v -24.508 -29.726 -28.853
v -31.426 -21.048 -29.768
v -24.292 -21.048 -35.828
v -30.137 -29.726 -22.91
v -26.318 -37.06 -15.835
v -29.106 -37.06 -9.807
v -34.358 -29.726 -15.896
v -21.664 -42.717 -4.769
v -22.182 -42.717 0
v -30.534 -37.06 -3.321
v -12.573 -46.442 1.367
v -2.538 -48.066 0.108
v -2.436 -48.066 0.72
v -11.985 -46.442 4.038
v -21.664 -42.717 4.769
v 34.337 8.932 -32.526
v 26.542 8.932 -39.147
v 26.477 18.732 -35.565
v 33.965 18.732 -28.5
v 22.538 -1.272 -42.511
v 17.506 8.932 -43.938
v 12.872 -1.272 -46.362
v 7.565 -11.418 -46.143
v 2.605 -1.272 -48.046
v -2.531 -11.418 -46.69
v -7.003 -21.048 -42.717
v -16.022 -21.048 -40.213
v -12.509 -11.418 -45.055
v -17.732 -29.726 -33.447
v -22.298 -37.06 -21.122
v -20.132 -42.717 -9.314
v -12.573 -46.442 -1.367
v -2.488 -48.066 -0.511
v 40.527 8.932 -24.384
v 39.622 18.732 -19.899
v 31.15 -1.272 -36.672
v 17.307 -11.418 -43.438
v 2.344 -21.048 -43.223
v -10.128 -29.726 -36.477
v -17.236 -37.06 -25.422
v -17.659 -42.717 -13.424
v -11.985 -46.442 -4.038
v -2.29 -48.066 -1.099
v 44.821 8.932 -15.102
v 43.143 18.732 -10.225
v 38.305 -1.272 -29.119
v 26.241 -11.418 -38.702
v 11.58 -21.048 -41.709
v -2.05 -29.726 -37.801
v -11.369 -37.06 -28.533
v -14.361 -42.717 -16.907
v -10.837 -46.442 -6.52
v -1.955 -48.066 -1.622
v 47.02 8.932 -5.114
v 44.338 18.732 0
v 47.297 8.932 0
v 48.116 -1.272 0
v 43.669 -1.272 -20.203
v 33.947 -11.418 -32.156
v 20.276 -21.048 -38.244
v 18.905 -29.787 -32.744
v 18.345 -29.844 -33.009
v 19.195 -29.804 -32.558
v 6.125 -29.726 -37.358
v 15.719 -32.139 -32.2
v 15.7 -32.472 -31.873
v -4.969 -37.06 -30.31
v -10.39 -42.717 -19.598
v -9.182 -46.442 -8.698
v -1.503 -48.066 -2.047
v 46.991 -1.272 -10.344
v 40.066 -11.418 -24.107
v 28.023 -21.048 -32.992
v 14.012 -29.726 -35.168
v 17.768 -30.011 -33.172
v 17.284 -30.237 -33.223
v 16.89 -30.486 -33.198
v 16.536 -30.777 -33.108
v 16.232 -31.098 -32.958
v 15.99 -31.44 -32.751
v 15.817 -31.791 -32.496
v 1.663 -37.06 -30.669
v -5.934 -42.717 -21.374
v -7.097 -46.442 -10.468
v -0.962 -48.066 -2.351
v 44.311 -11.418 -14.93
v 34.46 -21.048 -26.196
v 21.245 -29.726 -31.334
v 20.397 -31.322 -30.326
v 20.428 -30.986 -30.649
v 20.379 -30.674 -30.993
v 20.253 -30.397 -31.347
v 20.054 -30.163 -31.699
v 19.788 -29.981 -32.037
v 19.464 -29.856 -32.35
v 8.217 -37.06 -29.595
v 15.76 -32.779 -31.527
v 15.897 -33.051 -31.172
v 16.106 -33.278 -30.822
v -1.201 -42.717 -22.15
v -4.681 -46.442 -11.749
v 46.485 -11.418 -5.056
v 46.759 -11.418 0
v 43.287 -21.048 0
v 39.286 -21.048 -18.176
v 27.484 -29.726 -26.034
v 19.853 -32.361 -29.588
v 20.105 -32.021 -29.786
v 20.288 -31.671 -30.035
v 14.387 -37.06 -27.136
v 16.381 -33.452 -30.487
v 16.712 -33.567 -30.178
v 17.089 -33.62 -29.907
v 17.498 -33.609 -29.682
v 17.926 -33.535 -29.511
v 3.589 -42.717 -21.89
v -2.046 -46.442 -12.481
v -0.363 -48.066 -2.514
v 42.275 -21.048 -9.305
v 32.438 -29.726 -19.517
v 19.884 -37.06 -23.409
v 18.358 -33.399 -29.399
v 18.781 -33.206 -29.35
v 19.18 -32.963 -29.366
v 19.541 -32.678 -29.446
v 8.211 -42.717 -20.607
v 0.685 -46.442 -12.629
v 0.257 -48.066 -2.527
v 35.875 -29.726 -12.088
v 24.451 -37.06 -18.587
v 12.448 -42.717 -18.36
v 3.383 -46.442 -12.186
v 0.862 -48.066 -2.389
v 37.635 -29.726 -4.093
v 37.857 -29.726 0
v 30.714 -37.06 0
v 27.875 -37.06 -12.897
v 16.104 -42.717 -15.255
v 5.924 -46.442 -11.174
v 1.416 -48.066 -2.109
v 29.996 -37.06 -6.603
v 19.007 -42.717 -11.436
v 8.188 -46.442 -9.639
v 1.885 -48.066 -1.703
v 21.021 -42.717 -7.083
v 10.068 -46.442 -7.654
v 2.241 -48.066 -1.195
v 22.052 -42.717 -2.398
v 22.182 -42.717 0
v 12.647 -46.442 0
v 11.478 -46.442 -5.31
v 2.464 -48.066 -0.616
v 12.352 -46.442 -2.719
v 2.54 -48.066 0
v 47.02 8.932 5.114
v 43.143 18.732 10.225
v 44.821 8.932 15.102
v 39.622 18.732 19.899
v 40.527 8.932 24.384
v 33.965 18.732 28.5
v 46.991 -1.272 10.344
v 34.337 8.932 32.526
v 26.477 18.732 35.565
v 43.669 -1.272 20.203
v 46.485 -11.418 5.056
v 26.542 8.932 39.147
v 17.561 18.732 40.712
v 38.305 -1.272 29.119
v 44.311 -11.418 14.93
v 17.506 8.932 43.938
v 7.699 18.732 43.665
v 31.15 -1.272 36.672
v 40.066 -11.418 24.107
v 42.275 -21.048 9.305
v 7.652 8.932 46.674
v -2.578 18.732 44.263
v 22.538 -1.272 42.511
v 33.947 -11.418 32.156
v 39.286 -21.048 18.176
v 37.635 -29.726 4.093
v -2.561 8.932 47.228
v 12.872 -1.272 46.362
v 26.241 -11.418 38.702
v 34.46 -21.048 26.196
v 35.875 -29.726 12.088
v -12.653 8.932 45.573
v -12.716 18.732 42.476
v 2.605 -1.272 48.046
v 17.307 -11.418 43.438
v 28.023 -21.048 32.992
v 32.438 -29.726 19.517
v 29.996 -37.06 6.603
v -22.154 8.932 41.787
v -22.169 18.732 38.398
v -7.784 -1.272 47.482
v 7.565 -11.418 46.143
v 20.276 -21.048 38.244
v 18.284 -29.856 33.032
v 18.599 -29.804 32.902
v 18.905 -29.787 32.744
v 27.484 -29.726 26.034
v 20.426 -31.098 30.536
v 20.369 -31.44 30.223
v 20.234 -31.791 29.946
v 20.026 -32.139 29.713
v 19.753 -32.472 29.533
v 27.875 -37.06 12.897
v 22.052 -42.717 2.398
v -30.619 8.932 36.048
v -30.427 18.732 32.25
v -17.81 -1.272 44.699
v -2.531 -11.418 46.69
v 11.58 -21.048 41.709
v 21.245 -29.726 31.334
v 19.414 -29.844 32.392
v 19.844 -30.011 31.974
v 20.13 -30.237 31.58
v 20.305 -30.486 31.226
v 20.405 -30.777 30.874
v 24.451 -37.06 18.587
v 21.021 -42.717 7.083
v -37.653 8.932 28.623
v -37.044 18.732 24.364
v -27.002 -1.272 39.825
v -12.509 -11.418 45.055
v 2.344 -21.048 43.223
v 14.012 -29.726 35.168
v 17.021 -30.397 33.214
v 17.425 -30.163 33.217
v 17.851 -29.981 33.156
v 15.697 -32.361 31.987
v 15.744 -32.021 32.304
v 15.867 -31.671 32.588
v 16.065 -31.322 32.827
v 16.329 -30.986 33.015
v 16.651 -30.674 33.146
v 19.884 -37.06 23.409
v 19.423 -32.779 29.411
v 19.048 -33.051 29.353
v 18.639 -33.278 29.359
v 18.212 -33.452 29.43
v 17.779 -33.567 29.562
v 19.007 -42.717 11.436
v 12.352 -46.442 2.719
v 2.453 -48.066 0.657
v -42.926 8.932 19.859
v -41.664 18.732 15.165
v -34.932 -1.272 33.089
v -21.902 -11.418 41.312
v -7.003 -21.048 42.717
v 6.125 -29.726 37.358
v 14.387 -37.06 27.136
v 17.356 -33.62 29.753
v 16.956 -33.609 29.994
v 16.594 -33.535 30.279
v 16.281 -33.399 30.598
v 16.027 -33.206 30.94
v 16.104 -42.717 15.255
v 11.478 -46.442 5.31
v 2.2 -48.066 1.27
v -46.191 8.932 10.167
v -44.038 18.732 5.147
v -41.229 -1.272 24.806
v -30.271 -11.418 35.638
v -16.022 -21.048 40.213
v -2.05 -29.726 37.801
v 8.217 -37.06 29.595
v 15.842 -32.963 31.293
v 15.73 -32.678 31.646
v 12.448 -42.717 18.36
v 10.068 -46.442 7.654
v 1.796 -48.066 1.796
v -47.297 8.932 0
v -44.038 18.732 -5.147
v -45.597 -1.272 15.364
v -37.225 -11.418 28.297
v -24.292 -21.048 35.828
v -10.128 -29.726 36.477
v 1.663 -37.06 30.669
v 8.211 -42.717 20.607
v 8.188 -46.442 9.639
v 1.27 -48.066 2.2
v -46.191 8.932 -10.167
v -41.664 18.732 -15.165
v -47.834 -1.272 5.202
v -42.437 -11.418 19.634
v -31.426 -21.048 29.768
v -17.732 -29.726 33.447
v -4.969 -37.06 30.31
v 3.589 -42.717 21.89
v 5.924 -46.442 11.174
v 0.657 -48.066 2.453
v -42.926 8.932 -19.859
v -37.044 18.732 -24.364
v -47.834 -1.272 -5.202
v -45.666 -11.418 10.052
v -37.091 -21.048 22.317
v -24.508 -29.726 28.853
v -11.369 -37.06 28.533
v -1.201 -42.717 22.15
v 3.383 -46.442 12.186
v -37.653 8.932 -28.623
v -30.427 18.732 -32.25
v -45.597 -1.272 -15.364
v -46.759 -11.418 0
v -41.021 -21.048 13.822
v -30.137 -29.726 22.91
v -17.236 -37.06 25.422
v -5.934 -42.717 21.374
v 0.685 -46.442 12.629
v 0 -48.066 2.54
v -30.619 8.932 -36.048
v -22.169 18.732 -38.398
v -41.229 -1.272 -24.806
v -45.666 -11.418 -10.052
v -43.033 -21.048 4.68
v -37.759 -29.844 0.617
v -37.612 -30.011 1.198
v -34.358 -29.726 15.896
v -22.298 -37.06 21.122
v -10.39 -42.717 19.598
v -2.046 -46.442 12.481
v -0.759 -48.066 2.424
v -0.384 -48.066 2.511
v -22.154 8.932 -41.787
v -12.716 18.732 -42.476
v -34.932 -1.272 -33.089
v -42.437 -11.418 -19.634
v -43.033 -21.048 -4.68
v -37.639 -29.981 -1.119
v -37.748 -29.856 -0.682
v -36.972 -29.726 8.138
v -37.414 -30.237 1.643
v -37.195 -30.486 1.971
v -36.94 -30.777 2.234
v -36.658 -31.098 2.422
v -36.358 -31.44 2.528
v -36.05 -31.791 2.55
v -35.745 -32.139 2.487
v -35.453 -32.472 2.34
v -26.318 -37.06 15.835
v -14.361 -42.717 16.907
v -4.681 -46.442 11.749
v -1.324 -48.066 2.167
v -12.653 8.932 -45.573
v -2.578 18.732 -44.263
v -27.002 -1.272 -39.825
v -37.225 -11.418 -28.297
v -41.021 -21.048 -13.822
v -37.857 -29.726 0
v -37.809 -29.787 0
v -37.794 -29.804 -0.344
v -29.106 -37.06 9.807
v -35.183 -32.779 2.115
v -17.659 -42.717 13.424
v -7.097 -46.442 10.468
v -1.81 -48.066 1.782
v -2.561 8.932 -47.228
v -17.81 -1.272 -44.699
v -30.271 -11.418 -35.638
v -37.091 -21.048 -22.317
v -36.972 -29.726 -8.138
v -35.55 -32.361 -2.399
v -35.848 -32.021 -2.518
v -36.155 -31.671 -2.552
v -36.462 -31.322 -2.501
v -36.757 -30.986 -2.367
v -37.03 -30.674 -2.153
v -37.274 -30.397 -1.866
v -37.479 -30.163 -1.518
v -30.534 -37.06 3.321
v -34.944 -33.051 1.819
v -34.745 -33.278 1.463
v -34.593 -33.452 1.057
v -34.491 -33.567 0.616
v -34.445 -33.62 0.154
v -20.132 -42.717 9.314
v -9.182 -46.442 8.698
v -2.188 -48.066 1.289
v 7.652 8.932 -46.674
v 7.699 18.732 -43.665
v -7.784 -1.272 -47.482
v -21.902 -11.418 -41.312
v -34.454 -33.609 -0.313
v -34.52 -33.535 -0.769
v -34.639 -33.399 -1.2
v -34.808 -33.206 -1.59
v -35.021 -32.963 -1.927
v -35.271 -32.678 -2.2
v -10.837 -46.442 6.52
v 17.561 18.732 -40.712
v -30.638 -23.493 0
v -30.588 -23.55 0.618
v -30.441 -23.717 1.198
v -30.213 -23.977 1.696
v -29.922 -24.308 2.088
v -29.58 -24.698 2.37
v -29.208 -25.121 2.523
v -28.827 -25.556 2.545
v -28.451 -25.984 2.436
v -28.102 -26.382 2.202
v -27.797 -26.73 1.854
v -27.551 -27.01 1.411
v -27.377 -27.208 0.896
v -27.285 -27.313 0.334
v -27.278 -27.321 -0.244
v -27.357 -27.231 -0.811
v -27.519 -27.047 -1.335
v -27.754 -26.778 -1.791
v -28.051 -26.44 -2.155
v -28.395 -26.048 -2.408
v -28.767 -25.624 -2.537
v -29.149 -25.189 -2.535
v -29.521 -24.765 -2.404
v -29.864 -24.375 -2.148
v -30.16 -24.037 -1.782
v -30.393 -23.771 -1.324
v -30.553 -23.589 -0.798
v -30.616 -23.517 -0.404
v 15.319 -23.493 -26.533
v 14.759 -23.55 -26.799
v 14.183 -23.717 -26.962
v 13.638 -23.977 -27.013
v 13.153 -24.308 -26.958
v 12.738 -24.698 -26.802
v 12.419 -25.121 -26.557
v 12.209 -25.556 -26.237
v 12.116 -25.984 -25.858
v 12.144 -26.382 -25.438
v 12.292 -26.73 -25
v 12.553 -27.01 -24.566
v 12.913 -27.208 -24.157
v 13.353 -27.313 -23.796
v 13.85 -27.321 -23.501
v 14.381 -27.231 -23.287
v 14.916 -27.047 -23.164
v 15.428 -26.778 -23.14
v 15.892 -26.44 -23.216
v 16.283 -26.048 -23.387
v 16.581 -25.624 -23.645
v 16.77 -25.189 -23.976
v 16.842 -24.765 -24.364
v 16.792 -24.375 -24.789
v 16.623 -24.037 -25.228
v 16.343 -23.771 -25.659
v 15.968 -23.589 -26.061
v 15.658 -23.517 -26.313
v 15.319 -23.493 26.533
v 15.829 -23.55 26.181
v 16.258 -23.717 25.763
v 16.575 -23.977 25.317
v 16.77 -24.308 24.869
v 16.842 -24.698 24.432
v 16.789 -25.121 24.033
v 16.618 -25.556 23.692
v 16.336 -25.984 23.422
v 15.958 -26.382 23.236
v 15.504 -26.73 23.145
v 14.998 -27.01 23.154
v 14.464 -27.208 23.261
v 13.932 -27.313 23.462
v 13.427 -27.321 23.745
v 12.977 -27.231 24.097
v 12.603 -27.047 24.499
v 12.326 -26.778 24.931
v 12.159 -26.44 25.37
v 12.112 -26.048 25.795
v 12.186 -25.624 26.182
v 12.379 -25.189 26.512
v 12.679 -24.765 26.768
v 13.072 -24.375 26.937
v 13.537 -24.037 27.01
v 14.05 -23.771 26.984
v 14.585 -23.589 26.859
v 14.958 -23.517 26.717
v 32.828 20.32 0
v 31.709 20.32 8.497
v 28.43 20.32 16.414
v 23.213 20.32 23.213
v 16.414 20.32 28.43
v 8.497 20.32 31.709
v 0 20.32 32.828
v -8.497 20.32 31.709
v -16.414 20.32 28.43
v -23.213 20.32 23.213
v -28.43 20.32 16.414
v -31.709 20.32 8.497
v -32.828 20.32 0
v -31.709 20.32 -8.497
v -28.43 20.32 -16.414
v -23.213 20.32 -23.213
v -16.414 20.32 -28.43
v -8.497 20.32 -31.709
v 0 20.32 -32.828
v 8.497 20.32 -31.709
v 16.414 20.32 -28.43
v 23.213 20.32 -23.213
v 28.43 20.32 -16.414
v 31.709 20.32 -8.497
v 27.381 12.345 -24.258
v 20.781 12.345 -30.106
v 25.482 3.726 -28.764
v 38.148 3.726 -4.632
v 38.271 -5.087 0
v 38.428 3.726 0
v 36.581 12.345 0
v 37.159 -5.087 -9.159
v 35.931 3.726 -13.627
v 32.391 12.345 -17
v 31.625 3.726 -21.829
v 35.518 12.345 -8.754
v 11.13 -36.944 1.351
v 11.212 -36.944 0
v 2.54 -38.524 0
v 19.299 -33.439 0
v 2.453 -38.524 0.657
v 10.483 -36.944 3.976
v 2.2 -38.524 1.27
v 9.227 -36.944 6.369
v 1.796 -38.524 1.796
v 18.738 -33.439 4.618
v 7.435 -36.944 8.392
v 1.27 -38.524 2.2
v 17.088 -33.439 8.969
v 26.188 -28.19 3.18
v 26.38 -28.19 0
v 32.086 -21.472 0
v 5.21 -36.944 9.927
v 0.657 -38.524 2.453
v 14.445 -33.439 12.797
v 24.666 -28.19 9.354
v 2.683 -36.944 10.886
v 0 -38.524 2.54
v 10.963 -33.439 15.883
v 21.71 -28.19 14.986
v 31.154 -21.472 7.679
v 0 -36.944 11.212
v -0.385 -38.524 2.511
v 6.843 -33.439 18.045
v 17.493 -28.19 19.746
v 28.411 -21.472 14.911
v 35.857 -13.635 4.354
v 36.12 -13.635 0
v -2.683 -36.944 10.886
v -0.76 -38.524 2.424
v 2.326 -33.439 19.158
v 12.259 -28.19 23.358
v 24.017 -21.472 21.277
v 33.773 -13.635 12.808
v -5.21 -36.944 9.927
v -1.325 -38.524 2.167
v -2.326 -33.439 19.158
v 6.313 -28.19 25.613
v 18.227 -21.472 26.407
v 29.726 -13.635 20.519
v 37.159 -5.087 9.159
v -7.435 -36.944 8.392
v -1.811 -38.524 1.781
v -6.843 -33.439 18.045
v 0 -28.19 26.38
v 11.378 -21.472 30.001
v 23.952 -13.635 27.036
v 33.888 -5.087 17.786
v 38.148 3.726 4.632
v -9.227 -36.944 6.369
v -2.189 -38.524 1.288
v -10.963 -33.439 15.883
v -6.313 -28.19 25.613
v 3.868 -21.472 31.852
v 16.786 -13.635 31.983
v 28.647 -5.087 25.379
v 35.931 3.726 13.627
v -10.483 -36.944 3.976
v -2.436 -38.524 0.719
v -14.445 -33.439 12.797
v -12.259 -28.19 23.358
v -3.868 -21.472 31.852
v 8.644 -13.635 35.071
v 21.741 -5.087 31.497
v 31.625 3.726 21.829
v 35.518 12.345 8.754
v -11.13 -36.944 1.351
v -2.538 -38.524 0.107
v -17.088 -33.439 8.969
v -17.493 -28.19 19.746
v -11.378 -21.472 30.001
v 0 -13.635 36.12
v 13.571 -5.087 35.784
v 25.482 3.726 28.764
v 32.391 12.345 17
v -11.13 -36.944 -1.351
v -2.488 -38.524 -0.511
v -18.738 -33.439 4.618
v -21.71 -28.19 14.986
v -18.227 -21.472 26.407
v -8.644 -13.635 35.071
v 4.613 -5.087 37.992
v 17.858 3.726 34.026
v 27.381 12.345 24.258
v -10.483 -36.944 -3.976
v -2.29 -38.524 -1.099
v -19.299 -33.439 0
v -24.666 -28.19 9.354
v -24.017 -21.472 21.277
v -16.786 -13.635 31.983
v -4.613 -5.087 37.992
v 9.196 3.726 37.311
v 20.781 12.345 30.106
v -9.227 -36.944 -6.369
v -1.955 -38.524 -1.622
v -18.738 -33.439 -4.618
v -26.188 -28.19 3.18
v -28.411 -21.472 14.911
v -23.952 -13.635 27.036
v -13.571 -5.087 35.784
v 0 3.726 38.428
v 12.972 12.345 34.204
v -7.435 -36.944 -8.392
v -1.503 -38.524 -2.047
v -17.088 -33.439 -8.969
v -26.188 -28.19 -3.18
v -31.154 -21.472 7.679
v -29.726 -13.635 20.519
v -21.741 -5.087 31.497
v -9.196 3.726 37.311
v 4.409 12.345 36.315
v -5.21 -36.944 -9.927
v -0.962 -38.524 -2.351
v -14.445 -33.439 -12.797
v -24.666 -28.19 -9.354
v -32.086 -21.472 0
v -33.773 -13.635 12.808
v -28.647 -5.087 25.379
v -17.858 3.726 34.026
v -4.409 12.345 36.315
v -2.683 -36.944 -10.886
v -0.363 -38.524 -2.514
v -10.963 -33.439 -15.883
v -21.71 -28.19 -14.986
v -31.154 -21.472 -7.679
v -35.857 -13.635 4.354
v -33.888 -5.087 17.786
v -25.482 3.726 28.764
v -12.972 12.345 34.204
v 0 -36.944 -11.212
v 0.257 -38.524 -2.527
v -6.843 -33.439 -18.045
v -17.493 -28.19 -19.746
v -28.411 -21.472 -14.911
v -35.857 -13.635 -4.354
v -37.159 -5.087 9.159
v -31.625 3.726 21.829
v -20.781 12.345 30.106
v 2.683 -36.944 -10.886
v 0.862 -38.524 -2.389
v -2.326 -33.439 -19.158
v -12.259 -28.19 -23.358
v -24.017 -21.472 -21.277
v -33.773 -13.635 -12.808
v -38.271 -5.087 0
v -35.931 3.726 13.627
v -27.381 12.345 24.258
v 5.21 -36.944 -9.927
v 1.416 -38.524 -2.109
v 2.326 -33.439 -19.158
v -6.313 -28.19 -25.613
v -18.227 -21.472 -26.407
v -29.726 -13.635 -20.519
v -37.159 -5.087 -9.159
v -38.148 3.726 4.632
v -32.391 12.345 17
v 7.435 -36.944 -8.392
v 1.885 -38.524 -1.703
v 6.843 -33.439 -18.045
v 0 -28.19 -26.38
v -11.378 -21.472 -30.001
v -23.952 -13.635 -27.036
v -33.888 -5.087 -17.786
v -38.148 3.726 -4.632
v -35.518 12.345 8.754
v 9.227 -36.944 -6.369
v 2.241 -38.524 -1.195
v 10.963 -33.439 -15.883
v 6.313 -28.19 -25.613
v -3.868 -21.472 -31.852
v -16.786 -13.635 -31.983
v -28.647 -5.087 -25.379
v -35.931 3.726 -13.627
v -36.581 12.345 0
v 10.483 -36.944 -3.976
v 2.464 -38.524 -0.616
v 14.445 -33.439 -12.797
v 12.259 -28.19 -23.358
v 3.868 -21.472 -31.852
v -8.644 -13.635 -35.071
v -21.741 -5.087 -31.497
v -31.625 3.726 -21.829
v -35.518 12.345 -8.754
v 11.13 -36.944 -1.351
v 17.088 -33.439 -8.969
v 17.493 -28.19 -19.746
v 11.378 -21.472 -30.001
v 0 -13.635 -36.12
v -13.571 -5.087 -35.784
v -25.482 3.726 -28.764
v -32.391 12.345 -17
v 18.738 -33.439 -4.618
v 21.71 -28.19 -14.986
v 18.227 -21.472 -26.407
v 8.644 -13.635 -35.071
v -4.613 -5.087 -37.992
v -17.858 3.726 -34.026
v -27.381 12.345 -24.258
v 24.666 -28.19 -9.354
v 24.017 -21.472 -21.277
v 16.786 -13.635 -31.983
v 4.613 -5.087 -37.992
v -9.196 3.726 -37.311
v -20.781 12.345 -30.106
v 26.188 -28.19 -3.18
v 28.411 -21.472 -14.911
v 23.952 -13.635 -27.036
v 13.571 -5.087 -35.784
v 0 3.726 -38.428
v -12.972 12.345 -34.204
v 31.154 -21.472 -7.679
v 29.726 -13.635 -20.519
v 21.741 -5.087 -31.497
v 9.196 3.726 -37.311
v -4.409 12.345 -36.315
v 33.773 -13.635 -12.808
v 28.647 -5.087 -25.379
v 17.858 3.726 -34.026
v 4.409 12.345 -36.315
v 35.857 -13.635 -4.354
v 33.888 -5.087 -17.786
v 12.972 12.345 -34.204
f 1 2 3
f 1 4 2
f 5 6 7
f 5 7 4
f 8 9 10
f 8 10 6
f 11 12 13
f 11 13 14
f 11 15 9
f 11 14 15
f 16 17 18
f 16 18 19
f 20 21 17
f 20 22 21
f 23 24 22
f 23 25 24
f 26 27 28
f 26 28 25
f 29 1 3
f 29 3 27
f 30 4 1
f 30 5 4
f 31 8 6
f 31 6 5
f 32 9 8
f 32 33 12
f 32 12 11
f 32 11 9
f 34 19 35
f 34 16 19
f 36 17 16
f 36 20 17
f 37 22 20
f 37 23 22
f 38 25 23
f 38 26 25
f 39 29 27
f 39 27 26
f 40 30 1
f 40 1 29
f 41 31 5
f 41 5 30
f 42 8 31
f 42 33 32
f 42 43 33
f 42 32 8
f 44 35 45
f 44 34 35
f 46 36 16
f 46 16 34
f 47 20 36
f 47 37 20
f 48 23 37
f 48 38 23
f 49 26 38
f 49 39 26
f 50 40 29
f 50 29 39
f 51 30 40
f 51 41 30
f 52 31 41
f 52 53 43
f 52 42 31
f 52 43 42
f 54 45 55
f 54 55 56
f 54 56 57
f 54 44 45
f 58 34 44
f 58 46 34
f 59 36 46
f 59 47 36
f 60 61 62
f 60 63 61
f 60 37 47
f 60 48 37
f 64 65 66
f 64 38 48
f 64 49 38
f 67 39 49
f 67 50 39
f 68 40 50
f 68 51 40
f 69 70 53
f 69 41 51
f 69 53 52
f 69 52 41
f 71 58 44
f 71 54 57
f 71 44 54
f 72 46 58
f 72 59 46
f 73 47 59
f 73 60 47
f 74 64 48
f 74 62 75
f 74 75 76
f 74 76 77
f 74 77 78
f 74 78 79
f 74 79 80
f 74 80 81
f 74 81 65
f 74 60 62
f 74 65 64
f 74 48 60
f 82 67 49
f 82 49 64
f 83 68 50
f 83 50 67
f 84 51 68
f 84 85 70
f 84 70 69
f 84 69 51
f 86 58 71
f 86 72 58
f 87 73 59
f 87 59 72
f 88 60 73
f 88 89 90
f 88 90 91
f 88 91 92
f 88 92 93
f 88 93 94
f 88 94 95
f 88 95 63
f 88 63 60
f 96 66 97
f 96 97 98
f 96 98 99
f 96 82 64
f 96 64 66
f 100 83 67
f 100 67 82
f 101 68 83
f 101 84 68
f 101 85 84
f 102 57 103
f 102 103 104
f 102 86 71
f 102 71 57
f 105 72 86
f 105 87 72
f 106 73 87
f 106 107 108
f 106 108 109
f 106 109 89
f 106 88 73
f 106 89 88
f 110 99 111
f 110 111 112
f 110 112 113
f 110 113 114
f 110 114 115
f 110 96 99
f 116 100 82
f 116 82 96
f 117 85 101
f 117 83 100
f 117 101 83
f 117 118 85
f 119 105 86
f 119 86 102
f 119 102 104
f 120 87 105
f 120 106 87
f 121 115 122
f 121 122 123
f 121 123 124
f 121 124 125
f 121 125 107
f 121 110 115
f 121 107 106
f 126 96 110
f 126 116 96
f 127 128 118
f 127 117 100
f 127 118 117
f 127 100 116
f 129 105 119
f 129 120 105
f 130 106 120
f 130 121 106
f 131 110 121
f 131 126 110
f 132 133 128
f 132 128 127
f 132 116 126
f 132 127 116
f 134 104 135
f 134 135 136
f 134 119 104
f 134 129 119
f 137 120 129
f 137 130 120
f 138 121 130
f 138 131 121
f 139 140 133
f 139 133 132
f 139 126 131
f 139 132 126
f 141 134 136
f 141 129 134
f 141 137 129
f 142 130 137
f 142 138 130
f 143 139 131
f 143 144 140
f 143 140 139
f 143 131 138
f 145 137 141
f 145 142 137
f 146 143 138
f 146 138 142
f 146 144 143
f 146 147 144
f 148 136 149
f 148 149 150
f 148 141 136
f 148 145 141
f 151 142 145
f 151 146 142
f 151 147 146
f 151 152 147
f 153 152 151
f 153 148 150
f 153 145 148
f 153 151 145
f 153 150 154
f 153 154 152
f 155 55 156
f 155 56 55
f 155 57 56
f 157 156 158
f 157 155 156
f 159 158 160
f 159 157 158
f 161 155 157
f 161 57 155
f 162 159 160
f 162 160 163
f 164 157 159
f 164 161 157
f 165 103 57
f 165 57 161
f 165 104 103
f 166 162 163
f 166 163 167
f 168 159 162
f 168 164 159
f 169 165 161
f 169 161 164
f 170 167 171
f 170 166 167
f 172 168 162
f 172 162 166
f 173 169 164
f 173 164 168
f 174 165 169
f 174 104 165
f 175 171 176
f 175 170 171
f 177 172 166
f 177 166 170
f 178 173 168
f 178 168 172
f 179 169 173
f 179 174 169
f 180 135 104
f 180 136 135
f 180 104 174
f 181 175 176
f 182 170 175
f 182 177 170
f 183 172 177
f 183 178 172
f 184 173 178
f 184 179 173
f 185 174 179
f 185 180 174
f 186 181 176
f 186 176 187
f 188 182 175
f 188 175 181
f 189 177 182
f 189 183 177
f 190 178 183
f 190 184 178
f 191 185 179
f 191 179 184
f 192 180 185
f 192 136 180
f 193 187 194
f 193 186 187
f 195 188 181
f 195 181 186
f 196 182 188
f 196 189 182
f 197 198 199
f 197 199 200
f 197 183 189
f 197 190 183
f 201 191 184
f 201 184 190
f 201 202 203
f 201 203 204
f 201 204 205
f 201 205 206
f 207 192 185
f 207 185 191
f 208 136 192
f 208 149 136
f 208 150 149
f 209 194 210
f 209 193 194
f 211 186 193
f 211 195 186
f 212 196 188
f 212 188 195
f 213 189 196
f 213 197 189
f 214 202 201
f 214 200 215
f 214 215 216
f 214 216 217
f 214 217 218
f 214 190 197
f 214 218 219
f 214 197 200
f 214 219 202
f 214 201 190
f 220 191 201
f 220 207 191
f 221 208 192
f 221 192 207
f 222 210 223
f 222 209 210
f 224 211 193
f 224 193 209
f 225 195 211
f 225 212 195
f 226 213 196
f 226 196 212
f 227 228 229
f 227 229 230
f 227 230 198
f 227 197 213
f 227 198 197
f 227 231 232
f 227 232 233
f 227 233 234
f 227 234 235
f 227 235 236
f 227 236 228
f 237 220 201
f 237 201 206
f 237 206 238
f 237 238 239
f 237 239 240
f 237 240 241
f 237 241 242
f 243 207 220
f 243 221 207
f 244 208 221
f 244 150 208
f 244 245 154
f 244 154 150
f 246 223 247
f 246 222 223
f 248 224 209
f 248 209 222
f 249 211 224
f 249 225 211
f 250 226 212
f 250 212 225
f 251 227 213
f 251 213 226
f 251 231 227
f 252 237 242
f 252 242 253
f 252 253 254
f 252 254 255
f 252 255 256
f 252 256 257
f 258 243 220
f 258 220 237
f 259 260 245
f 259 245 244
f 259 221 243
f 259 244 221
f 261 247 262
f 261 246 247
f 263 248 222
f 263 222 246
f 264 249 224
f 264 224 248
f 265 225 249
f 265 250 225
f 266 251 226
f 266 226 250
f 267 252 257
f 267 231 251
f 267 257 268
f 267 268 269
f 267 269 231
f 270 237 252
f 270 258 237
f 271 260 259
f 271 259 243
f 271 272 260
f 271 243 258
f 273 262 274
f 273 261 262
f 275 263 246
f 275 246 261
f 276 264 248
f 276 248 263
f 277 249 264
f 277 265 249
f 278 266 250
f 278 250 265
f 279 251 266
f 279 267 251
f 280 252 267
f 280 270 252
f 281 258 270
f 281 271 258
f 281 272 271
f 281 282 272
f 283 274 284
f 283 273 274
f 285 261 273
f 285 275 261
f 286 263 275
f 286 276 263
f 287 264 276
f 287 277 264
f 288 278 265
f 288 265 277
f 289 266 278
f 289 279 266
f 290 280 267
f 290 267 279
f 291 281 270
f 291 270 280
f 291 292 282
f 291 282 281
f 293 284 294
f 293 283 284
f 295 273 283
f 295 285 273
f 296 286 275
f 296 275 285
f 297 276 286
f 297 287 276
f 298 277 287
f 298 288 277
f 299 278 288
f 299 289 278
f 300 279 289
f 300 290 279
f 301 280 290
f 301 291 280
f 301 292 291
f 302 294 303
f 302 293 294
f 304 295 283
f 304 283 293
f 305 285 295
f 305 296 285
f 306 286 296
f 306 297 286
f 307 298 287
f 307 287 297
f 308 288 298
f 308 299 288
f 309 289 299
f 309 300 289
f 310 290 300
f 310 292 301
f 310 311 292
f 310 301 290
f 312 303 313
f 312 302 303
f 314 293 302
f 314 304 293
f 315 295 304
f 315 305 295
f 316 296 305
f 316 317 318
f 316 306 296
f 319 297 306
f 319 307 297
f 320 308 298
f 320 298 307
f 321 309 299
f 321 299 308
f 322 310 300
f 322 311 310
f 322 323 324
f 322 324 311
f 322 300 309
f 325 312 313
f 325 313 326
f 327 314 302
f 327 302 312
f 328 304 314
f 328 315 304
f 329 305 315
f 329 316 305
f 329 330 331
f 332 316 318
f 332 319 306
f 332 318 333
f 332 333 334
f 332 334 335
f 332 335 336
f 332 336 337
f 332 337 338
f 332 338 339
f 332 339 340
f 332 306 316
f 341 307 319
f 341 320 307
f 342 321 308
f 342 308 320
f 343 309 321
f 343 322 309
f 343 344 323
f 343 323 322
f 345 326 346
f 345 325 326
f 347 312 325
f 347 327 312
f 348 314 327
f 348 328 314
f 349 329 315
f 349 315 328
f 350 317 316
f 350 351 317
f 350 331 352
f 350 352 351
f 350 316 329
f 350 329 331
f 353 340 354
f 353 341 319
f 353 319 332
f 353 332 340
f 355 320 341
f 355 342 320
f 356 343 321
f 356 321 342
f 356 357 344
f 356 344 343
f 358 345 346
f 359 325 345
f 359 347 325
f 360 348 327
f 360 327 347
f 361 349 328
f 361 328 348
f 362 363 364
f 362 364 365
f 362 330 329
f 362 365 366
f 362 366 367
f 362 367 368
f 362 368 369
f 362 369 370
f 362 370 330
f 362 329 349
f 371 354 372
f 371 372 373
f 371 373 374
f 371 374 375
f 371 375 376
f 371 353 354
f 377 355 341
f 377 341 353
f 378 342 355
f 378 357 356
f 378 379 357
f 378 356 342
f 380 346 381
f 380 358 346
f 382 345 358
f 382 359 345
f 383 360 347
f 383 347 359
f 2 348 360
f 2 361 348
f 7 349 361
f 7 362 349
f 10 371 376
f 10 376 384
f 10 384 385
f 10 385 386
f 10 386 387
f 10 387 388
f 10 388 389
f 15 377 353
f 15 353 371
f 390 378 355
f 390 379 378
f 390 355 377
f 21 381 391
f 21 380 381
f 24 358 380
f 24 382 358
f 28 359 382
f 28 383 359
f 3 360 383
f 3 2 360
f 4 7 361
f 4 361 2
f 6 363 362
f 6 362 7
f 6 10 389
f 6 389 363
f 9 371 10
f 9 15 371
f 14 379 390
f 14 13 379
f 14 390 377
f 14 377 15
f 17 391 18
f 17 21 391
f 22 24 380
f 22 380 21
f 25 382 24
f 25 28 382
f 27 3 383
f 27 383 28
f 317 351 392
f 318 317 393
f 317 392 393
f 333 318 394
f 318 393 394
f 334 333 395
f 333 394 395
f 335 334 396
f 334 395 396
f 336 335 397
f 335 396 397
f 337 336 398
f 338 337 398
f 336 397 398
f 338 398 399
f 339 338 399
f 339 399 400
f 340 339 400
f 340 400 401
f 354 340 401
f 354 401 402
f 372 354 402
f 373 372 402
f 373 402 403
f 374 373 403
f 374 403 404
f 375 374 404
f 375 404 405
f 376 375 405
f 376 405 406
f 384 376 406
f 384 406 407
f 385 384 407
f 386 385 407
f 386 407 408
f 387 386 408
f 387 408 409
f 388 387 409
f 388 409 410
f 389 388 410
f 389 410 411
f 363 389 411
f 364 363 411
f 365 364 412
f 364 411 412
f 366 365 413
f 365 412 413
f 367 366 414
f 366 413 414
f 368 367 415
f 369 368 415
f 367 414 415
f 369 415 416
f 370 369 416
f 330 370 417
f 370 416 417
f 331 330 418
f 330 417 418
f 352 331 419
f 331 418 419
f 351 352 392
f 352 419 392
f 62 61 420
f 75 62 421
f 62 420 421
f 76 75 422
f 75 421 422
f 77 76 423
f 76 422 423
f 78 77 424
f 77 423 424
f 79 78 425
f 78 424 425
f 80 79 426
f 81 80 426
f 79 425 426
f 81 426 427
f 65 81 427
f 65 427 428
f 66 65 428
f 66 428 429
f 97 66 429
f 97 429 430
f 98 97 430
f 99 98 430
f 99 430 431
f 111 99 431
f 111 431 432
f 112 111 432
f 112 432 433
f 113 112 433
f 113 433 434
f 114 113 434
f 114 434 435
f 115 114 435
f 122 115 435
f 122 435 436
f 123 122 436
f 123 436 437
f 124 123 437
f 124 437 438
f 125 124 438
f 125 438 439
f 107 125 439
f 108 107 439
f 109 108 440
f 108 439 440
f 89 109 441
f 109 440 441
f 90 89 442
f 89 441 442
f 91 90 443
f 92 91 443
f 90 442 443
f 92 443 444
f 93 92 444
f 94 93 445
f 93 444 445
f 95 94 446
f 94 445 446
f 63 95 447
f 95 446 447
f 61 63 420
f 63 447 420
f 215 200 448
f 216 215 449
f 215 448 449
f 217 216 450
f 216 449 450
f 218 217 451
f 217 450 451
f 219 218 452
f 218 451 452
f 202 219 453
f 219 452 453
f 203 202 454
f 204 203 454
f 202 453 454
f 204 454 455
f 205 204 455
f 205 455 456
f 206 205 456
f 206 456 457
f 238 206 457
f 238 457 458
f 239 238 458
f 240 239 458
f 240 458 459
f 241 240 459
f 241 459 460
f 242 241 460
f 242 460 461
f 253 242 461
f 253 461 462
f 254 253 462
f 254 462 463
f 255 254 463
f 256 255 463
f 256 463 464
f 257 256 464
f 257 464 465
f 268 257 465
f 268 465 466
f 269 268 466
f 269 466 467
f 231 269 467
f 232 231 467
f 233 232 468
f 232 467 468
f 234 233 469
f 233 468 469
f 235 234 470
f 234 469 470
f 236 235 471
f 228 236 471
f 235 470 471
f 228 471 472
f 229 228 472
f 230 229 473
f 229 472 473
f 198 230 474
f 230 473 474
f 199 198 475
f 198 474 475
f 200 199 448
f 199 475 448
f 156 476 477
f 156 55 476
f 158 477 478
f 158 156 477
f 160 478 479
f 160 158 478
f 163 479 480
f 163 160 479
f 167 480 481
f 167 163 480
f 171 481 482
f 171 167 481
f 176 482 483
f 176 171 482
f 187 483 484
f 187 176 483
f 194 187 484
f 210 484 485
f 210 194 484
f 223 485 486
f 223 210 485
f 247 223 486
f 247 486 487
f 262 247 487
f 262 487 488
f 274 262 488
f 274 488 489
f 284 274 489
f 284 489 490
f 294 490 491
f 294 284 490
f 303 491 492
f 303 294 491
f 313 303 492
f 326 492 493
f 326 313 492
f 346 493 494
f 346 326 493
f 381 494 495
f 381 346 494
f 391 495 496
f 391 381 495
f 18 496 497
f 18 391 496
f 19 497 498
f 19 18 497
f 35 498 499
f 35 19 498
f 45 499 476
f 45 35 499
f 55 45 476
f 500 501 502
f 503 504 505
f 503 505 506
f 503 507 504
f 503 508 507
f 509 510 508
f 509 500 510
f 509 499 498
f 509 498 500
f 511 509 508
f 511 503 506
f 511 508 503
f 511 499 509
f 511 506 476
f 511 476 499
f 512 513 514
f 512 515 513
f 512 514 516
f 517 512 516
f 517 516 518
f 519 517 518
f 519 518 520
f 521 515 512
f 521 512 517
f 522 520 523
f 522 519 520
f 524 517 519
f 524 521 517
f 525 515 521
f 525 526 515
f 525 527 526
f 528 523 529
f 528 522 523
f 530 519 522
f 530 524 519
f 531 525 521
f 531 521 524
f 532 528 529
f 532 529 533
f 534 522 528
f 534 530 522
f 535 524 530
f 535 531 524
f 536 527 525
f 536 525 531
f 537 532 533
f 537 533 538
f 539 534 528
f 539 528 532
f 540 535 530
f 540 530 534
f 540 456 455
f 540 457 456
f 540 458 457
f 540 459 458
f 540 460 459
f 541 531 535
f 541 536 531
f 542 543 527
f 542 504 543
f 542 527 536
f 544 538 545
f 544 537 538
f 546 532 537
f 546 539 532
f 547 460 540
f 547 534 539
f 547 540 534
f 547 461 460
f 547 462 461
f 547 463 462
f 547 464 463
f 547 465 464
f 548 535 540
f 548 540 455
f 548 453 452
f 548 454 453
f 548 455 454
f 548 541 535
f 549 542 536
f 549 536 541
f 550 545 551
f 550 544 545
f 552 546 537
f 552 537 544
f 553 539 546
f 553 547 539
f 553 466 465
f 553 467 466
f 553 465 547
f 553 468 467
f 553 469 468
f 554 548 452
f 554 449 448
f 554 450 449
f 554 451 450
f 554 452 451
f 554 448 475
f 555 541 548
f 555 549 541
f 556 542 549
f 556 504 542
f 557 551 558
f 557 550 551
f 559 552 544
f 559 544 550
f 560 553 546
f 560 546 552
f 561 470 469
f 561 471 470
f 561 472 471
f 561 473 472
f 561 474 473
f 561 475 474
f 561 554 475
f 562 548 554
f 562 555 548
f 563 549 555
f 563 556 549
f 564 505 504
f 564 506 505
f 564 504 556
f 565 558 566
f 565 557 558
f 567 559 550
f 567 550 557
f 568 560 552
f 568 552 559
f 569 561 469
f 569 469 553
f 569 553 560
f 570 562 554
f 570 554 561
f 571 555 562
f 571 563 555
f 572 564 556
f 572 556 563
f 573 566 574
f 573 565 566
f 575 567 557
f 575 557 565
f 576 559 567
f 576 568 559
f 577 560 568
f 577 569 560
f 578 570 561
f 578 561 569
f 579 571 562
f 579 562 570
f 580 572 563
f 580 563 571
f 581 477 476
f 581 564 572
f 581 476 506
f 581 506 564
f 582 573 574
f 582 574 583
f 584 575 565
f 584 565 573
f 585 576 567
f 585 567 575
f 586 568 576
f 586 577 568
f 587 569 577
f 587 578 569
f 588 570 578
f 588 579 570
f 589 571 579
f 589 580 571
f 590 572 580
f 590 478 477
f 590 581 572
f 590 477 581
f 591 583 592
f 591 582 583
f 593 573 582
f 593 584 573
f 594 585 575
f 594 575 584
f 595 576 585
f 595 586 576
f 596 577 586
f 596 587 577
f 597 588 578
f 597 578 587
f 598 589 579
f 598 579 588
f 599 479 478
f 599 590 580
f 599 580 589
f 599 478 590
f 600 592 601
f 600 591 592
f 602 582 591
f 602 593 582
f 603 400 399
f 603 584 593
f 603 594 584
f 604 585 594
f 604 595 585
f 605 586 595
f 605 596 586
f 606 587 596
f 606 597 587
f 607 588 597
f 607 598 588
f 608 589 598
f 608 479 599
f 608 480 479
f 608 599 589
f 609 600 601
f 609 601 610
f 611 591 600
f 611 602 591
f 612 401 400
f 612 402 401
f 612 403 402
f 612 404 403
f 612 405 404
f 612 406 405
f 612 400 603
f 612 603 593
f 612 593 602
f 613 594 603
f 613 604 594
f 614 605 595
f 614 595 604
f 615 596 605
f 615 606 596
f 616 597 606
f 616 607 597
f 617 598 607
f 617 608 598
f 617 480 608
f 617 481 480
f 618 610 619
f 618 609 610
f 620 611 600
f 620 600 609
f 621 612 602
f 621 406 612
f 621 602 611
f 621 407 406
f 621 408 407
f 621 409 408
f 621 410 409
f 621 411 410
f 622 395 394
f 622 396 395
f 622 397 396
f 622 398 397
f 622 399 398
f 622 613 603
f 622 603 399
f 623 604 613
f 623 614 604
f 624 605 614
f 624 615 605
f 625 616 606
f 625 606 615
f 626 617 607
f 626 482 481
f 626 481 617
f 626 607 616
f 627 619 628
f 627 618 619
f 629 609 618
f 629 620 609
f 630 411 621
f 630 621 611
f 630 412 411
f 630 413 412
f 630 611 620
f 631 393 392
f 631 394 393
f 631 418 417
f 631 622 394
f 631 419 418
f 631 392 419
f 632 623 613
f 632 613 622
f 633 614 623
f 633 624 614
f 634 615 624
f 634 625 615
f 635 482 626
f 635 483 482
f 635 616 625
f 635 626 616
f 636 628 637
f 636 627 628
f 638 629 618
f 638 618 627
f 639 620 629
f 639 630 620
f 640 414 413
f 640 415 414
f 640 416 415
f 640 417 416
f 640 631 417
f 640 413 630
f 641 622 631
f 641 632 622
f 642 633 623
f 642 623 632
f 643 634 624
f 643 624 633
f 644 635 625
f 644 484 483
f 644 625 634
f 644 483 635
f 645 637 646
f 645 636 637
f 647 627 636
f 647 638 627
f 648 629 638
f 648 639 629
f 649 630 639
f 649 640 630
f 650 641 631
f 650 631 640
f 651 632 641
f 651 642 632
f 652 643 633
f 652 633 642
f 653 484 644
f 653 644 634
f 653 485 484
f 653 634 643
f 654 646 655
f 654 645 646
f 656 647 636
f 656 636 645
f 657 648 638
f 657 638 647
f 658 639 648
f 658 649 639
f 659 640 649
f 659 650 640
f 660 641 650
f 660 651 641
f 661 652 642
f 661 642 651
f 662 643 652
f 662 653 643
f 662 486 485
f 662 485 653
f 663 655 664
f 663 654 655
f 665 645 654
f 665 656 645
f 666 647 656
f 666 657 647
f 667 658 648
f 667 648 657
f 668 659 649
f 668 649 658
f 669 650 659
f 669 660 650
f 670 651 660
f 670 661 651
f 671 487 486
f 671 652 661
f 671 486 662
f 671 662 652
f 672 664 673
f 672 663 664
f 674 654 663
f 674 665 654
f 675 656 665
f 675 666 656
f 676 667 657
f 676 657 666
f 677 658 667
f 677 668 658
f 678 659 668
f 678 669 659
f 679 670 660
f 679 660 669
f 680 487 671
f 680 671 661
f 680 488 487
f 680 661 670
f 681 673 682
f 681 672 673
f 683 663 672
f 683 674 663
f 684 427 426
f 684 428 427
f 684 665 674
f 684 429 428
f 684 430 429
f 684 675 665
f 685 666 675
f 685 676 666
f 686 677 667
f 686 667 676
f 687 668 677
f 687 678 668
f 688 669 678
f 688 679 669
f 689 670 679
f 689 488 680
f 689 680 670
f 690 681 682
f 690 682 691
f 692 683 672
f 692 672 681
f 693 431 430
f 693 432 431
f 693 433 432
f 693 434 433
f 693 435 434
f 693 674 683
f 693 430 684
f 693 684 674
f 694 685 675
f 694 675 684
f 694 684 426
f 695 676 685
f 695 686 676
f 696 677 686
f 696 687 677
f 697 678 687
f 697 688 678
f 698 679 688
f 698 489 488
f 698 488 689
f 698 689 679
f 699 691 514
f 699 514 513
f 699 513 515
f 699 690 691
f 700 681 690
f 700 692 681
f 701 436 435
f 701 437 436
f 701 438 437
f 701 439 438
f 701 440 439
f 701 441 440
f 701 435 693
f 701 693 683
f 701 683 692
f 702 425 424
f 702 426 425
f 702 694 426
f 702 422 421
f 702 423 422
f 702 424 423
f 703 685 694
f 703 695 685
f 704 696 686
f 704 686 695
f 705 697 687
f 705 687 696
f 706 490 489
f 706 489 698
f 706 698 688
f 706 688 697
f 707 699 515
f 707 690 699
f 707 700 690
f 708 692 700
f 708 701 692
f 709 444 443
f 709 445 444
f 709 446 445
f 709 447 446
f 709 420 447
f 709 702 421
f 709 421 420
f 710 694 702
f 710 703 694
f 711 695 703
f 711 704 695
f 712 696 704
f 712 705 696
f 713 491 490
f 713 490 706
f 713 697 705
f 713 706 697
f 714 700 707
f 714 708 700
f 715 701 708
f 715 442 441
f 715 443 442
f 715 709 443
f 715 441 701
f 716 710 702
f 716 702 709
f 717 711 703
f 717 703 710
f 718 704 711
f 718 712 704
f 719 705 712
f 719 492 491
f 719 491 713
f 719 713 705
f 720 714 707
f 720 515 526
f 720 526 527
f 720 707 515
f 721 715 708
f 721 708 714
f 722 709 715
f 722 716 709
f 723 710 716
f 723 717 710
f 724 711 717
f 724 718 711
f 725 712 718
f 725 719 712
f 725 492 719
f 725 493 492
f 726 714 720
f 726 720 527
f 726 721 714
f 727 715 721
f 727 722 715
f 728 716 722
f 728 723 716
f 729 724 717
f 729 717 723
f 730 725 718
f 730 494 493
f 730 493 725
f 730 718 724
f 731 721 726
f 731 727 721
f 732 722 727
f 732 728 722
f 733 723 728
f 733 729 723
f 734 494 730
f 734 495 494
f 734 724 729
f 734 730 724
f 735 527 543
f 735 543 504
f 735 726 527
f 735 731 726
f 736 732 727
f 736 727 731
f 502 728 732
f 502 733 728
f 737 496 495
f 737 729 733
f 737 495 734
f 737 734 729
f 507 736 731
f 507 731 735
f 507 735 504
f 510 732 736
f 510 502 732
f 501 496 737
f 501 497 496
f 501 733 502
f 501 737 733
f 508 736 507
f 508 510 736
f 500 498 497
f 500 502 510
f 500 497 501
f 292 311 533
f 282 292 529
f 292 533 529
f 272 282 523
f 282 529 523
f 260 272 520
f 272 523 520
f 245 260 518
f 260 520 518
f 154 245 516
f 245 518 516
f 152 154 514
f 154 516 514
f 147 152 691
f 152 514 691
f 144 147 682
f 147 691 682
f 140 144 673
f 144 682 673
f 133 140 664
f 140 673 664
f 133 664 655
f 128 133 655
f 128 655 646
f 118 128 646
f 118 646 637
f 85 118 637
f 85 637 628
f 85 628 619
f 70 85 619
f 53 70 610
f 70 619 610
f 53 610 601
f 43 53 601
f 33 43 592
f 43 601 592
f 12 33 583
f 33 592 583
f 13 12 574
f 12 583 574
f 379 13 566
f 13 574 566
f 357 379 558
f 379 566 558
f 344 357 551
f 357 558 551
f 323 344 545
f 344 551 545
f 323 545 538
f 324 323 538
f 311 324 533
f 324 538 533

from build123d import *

# Parameters (mm, degrees)
F_7_0_201_DIAMETER_HOLE1_D     = 5.1054
F_7_0_201_DIAMETER_HOLE1_DEPTH = 101.176865362
CIRPATTERN1_COUNT              = 3
SKETCH7_R                      = 2.54
CUT_EXTRUDE1_DEPTH             = 84.368801521


with BuildPart() as part:
    # Sketch1 one side → Revolve1 (revolve)
    with BuildSketch(Plane.XY, mode=Mode.PRIVATE) as revolve1_sk:
        with BuildLine():
            ThreePointArc((0, -38.608), (-33.727527511, -18.789133881), (-32.827964664, 20.32))
            Line((-32.827964664, 20.32), (-44.338235562, 18.7325))
            ThreePointArc((-44.338235562, 18.7325), (-40.115066443, -26.600134083), (0, -48.133))
            Line((0, -48.133), (0, -38.608))
        make_face()
    revolve(revolve1_sk.sketch.rotate(Axis((0, 48.133, 0), (0, -1, 0)), 180), axis=Axis((0, 48.133, 0), (0, -1, 0)))

    # #7 (0.201) Diameter Hole1
    with Locations(Plane(origin=(-36.176279369, -31.75, 0), x_dir=(0.65963060686, -0.751589956355, 0), z_dir=(-0.751589956355, -0.65963060686, 0))):
        with Locations((0, 0)):
            f_7_0_201_diameter_hole1 = Hole(F_7_0_201_DIAMETER_HOLE1_D / 2, depth=F_7_0_201_DIAMETER_HOLE1_DEPTH)

    # CirPattern1: #7 (0.201) Diameter Hole1 ×3 about axis
    cirpattern1_axis = Axis((0, 18.7325, 0), (0, 1, 0))
    for i in range(1, CIRPATTERN1_COUNT):
        add(f_7_0_201_diameter_hole1.rotate(cirpattern1_axis, i * 360 / CIRPATTERN1_COUNT), mode=Mode.SUBTRACT)

    # Sketch7 → Cut-Extrude1 (cut, through all)
    with BuildSketch(Plane(origin=(0, 0, 0), x_dir=(1, 0, 0), z_dir=(0, 1, 0))):
        with Locations(Location((0, 0, 0), (0, 0, 270))):
            Circle(SKETCH7_R)
    extrude(amount=-CUT_EXTRUDE1_DEPTH, mode=Mode.SUBTRACT)


solid = part.part
